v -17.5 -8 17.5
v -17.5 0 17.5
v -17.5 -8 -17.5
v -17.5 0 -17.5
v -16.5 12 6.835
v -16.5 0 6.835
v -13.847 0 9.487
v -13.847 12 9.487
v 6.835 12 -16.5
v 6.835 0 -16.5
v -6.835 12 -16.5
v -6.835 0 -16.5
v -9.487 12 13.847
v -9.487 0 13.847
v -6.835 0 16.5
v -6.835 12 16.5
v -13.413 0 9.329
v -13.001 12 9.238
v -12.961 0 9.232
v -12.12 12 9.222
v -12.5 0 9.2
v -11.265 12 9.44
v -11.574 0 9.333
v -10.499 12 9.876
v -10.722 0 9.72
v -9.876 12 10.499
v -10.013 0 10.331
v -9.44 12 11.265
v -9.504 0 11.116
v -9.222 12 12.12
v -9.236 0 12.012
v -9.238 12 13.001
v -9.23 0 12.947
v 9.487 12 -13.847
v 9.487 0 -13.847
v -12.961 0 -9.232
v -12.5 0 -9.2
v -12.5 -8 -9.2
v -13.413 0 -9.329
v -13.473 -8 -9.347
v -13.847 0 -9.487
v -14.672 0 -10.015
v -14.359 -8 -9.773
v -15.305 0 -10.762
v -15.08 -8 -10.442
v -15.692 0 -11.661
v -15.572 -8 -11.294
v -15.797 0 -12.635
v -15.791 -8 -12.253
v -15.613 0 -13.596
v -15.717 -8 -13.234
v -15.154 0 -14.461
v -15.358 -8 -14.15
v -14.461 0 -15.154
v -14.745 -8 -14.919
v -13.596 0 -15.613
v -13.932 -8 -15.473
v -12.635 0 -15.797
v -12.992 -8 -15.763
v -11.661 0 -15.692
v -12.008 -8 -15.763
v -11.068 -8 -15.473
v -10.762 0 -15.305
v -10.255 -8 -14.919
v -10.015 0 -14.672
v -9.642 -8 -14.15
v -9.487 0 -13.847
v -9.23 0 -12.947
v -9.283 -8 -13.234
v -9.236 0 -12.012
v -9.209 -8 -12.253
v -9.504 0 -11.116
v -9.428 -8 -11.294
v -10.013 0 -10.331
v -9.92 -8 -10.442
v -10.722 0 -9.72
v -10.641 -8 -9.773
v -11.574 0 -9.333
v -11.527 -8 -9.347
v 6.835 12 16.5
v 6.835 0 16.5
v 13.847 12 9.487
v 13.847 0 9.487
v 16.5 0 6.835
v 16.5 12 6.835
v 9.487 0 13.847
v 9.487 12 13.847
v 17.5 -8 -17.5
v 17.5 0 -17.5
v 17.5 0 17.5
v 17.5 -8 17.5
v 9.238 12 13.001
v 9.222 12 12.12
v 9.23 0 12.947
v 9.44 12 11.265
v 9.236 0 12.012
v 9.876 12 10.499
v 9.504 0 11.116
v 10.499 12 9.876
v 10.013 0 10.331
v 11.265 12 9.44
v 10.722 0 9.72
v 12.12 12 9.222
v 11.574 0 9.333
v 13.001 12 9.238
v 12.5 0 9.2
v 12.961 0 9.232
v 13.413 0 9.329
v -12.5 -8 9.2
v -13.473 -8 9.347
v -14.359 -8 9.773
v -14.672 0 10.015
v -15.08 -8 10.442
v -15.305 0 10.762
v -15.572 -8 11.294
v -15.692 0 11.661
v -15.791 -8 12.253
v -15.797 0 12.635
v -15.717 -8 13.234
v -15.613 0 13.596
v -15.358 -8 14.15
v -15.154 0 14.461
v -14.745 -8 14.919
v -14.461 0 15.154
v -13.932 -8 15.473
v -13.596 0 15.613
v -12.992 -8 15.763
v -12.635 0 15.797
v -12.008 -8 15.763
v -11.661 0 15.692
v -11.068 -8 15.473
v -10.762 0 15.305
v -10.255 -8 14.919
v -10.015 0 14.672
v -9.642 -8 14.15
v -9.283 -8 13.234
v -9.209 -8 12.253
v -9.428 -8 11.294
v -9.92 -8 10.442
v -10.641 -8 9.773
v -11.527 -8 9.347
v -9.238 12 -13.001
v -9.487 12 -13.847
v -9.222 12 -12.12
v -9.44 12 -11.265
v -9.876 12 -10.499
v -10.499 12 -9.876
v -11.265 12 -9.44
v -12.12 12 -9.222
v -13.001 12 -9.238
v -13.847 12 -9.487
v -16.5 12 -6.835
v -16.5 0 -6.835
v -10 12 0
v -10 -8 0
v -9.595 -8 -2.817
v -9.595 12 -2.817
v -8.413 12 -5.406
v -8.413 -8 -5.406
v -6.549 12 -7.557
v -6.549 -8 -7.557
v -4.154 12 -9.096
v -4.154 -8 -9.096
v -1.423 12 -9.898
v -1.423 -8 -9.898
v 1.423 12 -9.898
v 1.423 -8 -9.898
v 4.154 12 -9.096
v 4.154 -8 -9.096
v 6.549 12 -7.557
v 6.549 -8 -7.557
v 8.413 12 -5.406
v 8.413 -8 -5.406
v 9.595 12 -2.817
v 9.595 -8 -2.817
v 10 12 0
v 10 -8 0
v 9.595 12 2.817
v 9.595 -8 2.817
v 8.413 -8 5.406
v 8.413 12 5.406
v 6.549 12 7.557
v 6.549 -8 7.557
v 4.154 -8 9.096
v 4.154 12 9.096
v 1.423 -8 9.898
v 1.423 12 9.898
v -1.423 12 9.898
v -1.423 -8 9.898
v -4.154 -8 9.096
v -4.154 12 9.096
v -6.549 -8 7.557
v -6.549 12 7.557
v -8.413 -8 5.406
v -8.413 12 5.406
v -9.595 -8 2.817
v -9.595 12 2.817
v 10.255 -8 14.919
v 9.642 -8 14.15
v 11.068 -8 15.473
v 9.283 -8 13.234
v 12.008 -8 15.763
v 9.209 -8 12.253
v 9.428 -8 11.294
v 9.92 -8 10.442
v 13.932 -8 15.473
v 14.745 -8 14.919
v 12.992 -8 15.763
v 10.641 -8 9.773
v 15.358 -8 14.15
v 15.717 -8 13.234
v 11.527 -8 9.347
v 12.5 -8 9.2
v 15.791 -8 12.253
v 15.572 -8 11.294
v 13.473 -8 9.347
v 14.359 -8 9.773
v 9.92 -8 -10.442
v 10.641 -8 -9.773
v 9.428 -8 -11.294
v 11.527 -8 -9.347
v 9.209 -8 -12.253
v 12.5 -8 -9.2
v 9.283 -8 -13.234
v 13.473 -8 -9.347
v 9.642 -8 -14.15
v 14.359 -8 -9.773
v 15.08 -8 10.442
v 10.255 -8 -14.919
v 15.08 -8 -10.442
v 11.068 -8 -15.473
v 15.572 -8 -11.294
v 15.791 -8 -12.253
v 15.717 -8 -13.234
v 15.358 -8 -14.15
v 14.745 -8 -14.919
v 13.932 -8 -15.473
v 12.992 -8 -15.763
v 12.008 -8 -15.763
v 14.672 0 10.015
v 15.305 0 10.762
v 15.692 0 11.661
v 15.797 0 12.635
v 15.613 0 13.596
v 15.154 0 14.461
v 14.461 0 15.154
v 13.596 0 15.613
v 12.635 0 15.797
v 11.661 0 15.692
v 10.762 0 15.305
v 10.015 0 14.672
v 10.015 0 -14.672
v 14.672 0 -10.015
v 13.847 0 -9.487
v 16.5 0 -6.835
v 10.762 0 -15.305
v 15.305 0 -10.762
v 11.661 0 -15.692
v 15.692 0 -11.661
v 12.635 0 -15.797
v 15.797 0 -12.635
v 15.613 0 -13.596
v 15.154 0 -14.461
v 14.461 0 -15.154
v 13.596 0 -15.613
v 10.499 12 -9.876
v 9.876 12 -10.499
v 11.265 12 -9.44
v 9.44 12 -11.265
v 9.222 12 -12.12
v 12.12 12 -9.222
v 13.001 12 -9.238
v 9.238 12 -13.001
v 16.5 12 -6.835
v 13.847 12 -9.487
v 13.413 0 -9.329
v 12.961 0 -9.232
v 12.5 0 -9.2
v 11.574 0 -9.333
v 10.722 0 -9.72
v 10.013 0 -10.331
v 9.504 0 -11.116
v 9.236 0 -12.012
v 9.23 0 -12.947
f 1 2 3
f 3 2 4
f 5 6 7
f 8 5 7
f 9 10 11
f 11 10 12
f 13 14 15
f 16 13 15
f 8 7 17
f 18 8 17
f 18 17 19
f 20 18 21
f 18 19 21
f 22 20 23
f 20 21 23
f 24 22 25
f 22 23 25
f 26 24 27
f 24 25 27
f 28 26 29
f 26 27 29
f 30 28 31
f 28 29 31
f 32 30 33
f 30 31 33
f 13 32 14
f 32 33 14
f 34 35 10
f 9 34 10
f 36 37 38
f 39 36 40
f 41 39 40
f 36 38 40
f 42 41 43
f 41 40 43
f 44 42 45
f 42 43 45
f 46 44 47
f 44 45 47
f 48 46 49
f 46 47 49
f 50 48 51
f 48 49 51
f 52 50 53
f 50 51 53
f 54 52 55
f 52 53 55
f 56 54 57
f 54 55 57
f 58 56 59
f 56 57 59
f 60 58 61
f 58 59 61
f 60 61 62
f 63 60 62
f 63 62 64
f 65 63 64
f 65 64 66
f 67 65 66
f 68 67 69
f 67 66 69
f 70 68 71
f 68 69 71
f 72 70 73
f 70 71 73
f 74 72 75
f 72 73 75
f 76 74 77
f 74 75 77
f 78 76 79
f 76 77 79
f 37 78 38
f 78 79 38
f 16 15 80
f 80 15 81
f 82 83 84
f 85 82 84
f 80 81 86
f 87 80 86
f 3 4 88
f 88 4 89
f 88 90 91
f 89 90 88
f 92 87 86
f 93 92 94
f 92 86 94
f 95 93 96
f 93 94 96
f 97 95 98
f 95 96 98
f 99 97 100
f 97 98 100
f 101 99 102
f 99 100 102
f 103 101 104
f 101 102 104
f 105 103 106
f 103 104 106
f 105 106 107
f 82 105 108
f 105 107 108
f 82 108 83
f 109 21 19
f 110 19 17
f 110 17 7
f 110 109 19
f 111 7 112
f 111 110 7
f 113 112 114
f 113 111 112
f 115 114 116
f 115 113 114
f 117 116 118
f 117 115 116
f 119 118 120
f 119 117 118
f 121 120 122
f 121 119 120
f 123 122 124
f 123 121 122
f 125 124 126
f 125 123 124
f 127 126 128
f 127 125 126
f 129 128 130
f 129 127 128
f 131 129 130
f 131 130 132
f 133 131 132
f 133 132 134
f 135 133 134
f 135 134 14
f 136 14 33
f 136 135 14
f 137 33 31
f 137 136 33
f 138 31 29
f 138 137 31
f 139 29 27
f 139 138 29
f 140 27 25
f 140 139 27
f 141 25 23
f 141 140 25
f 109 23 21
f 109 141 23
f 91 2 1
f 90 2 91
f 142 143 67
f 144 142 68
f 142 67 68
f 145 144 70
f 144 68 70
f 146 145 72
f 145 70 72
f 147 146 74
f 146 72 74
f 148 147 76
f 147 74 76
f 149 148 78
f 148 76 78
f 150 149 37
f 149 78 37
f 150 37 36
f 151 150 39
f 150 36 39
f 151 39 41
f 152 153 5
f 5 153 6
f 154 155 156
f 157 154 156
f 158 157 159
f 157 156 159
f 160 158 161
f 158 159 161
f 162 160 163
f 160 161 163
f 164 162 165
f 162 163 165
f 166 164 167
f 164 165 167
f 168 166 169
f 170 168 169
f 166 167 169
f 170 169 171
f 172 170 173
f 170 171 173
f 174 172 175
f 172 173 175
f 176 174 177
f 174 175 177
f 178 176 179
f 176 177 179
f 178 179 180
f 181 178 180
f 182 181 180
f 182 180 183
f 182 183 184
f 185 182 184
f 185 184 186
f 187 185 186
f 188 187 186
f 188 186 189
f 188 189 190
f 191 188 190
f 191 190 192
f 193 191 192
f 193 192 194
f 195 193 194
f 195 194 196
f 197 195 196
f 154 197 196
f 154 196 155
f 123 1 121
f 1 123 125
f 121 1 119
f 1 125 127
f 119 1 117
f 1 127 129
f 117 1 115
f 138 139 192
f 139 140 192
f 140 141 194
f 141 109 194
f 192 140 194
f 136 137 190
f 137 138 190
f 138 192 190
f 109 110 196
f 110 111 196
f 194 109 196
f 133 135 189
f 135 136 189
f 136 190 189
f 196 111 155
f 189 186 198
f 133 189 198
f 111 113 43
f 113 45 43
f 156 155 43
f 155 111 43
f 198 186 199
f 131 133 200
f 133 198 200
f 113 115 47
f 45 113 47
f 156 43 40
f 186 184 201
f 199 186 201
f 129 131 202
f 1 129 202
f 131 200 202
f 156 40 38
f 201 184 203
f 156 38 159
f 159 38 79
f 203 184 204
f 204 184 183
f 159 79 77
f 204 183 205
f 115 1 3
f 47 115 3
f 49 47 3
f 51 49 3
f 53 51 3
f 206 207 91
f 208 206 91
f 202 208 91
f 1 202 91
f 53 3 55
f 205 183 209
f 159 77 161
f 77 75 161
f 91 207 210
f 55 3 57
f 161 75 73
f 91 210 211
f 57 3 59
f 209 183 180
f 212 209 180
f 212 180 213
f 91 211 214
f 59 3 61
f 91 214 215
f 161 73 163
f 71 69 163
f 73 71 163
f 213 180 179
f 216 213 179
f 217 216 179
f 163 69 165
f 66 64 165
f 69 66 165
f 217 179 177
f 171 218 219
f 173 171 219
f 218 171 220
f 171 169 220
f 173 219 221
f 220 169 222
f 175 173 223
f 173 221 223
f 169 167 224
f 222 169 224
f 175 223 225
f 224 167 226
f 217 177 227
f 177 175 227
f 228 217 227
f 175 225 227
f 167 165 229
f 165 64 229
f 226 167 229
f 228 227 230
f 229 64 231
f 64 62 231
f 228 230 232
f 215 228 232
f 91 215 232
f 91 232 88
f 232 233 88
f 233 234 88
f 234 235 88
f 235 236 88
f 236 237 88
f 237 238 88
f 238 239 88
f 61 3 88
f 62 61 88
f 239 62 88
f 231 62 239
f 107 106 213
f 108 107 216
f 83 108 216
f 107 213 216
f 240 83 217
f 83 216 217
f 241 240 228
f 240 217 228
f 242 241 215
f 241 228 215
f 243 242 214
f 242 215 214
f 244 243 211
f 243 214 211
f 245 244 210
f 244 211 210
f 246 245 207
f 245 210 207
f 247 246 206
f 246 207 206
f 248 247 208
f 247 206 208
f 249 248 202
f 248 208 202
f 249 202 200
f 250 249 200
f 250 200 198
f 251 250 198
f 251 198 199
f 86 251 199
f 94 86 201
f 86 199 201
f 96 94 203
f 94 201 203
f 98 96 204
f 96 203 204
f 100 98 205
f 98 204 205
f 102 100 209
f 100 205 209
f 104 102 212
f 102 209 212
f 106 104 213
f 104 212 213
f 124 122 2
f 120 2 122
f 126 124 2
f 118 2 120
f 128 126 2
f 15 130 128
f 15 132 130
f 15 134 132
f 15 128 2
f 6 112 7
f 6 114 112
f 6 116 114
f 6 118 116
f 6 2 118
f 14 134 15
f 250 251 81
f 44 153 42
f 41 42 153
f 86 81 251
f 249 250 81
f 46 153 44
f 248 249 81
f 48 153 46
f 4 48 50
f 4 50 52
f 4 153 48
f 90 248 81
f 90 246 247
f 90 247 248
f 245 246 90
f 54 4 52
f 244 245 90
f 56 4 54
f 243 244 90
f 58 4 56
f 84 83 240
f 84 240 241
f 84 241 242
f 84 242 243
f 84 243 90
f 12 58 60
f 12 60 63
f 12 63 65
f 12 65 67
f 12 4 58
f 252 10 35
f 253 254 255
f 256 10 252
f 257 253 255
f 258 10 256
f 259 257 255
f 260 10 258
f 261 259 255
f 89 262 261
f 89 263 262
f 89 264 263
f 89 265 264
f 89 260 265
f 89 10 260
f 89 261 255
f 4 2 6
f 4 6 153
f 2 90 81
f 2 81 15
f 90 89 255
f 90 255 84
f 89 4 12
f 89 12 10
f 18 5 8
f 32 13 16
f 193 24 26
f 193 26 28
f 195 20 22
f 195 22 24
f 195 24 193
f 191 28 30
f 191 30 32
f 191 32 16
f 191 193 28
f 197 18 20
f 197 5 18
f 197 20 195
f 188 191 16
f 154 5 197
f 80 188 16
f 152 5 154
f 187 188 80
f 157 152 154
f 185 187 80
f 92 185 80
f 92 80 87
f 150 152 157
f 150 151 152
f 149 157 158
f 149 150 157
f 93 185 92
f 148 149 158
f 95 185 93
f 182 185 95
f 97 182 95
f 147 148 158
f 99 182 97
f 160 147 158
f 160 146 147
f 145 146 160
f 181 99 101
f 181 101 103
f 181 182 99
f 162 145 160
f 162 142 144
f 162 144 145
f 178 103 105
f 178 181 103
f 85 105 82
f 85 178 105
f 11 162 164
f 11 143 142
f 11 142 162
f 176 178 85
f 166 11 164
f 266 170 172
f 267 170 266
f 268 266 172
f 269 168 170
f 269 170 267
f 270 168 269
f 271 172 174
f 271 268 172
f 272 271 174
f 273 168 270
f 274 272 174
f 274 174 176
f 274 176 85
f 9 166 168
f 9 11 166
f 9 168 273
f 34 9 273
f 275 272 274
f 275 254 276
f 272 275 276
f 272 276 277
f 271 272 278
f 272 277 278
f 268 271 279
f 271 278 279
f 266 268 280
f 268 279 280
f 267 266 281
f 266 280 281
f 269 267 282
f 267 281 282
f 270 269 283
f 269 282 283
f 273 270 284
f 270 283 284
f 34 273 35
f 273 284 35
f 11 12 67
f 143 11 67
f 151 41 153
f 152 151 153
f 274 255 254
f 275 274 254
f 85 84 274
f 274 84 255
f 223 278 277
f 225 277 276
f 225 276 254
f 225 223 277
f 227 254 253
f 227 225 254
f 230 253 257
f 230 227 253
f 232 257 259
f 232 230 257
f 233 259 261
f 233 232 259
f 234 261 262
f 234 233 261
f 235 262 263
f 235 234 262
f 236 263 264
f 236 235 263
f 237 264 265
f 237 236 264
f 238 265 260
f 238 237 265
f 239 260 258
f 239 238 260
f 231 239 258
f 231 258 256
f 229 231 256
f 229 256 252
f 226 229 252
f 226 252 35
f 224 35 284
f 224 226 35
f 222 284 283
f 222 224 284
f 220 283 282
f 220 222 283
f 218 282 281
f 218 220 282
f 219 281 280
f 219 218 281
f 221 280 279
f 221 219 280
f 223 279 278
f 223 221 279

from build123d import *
from build123d.topology import SkipClean

# Parameters (mm, degrees)
SKETCH1_W               = 35
SKETCH1_H               = 35
BOSS_EXTRUDE1_DEPTH     = 8
BOSS_EXTRUDE2_DEPTH     = 12
M18_CLEARANCE_HOLE1_D   = 20
SKETCH5_W               = 3.3
SKETCH5_H               = 8
CUT_EXTRUDE1_DEPTH      = 28.504545079
MIRROR5_COPY_1_SKETCH_W = 3.3
MIRROR5_COPY_1_SKETCH_H = 8
CUT_EXTRUDE2_DEPTH      = 28.504545079


with BuildPart() as part:
    # Sketch1 → Boss-Extrude1 (new body)
    with BuildSketch(Plane(origin=(0, 0, 0), x_dir=(1, 0, 0), z_dir=(0, 1, 0))):
        Rectangle(SKETCH1_W, SKETCH1_H)
    extrude(amount=-BOSS_EXTRUDE1_DEPTH)

    # Sketch1<3> → Boss-Extrude2 (add)
    with BuildSketch(Plane(origin=(0, 0, 0), x_dir=(1, 0, 0), z_dir=(0, 1, 0))):
        Polygon((-16.5, 6.834523779), (-16.5, -6.834523779), (-6.834523779, -16.5), (6.834523779, -16.5), (16.5, -6.834523779), (16.5, 6.834523779), (6.834523779, 16.5), (-6.834523779, 16.5), align=None)
    extrude(amount=BOSS_EXTRUDE2_DEPTH)

    # M18 Clearance Hole1 (through all)
    with Locations(Plane(origin=(0, 12, 0), x_dir=(1, 0, 0), z_dir=(0, 1, 0))):
        with Locations((0, 0)):
            Hole(M18_CLEARANCE_HOLE1_D / 2)

    # Sketch5 → M6 Clearance Hole1 (revolve, cut)
    with BuildSketch(Plane(origin=(-12.5, 0, -12.5), x_dir=(0, 0, 1), z_dir=(1, 0, 0))):
        with Locations((1.65, 4)):
            Rectangle(SKETCH5_W, SKETCH5_H)
    m6_clearance_hole1 = revolve(axis=Axis((-12.5, 6.35, -12.5), (0, -1, 0)), mode=Mode.SUBTRACT)

    # Sketch6 → Cut-Extrude1 (cut, through all)
    with SkipClean():  # the faces are left unmerged after this step: merging them gives an invalid solid
        with BuildSketch(Plane.XZ):
            with BuildLine():
                Line((-13.847066294, -9.487457486), (-9.487457486, -13.847066294))
                ThreePointArc((-9.487457486, -13.847066294), (-10.166547622, -10.166547622), (-13.847066294, -9.487457486))
            make_face()
        extrude(amount=-CUT_EXTRUDE1_DEPTH, mode=Mode.SUBTRACT)

    # Mirror4: M6 Clearance Hole1 across plane
    with SkipClean():  # the faces are left unmerged after this step: merging them gives an invalid solid
        add(m6_clearance_hole1.mirror(Plane(origin=(0, 0, 0), x_dir=(0, 0, 1), z_dir=(1, 0, 0))), mode=Mode.SUBTRACT)

    # Mirror5: M6 Clearance Hole1 across plane
    with SkipClean():  # the faces are left unmerged after this step: merging them gives an invalid solid
        add(m6_clearance_hole1.mirror(Plane.XY), mode=Mode.SUBTRACT)

    # Mirror5 copy 1 sketch → Mirror5 copy 1 (revolve, cut)
    with SkipClean():  # the faces are left unmerged after this step: merging them gives an invalid solid
        with BuildSketch(Plane(origin=(12.5, 0, 12.5), x_dir=(0, 0, -1), z_dir=(-1, 0, 0))):
            with Locations((1.65, 4)):
                Rectangle(MIRROR5_COPY_1_SKETCH_W, MIRROR5_COPY_1_SKETCH_H)
        revolve(axis=Axis((12.5, 6.35, 12.5), (0, -1, 0)), mode=Mode.SUBTRACT)

    # Sketch7 → Cut-Extrude2 (cut, through all)
    with SkipClean():  # the faces are left unmerged after this step: merging them gives an invalid solid
        with BuildSketch(Plane.XZ):
            with BuildLine():
                Line((-9.487457486, 13.847066294), (-13.847066294, 9.487457486))
                ThreePointArc((-13.847066294, 9.487457486), (-10.166547622, 10.166547622), (-9.487457486, 13.847066294))
            make_face()
            with BuildLine():
                Line((13.847066294, 9.487457486), (9.487457486, 13.847066294))
                ThreePointArc((9.487457486, 13.847066294), (10.166547622, 10.166547622), (13.847066294, 9.487457486))
            make_face()
            with BuildLine():
                Line((9.487457486, -13.847066294), (13.847066294, -9.487457486))
                ThreePointArc((13.847066294, -9.487457486), (10.166547622, -10.166547622), (9.487457486, -13.847066294))
            make_face()
        extrude(amount=-CUT_EXTRUDE2_DEPTH, mode=Mode.SUBTRACT)


solid = part.part
